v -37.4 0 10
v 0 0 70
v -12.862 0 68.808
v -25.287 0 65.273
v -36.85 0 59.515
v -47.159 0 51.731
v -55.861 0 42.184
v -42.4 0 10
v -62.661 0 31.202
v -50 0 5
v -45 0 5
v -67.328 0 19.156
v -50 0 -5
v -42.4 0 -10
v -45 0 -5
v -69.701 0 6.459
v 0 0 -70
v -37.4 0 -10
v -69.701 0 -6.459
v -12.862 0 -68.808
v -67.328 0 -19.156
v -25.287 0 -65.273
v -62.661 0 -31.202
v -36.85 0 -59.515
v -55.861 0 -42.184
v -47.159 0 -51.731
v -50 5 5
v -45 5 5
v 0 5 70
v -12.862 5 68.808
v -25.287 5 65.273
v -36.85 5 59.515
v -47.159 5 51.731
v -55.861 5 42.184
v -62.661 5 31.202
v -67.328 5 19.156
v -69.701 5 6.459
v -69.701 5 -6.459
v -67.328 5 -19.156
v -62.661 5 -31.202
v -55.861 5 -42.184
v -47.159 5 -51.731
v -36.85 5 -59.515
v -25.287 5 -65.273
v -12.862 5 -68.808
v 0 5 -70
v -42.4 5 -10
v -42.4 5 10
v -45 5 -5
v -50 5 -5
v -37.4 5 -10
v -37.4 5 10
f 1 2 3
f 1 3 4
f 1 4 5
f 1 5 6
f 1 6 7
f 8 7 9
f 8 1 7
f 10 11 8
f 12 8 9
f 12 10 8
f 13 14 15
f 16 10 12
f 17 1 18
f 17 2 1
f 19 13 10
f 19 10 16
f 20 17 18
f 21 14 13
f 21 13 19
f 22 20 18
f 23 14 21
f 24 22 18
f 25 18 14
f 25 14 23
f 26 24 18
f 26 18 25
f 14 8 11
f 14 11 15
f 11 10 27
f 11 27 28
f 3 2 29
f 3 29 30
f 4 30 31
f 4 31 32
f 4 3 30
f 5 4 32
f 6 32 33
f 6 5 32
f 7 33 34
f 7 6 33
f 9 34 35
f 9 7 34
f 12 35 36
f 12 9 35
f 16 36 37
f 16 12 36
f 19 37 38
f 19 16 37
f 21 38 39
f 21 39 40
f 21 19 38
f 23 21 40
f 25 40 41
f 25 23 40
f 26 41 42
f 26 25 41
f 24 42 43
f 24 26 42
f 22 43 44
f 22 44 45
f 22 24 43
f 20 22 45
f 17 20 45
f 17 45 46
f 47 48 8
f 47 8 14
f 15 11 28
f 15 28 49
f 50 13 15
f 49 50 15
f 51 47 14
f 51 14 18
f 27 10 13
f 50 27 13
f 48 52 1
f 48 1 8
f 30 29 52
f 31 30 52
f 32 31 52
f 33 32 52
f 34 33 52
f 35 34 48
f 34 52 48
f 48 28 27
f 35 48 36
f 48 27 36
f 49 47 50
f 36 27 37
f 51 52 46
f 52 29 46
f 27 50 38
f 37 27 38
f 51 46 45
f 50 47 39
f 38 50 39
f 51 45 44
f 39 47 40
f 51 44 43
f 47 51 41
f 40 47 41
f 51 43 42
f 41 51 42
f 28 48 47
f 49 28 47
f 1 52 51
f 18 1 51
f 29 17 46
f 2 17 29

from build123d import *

# Parameters (mm, degrees)
SKETCH1_W           = 5
SKETCH1_H           = 10
BOSS_EXTRUDE1_DEPTH = 5
CUT_EXTRUDE1_DEPTH  = 10


with BuildPart() as part:
    # Sketch1 → Boss-Extrude1 (new body)
    with BuildSketch(Plane(origin=(0, 0, 0), x_dir=(1, 0, 0), z_dir=(0, 1, 0))):
        with BuildLine():
            Line((0, 70), (0, -70))
            ThreePointArc((0, -70), (-70, 0), (0, 70))
        make_face()
        with Locations((-47.5, 0)):
            Rectangle(SKETCH1_W, SKETCH1_H, mode=Mode.SUBTRACT)
    extrude(amount=BOSS_EXTRUDE1_DEPTH)

    # Sketch2 → Cut-Extrude1 (cut)
    with BuildSketch(Plane(origin=(0, 5, 0), x_dir=(1, 0, 0), z_dir=(0, 1, 0))):
        Polygon((-37.4, 0), (-37.4, -10), (-42.4, -10), (-42.4, 10), (-37.4, 10), align=None)
    extrude(amount=-CUT_EXTRUDE1_DEPTH, mode=Mode.SUBTRACT)


solid = part.part
